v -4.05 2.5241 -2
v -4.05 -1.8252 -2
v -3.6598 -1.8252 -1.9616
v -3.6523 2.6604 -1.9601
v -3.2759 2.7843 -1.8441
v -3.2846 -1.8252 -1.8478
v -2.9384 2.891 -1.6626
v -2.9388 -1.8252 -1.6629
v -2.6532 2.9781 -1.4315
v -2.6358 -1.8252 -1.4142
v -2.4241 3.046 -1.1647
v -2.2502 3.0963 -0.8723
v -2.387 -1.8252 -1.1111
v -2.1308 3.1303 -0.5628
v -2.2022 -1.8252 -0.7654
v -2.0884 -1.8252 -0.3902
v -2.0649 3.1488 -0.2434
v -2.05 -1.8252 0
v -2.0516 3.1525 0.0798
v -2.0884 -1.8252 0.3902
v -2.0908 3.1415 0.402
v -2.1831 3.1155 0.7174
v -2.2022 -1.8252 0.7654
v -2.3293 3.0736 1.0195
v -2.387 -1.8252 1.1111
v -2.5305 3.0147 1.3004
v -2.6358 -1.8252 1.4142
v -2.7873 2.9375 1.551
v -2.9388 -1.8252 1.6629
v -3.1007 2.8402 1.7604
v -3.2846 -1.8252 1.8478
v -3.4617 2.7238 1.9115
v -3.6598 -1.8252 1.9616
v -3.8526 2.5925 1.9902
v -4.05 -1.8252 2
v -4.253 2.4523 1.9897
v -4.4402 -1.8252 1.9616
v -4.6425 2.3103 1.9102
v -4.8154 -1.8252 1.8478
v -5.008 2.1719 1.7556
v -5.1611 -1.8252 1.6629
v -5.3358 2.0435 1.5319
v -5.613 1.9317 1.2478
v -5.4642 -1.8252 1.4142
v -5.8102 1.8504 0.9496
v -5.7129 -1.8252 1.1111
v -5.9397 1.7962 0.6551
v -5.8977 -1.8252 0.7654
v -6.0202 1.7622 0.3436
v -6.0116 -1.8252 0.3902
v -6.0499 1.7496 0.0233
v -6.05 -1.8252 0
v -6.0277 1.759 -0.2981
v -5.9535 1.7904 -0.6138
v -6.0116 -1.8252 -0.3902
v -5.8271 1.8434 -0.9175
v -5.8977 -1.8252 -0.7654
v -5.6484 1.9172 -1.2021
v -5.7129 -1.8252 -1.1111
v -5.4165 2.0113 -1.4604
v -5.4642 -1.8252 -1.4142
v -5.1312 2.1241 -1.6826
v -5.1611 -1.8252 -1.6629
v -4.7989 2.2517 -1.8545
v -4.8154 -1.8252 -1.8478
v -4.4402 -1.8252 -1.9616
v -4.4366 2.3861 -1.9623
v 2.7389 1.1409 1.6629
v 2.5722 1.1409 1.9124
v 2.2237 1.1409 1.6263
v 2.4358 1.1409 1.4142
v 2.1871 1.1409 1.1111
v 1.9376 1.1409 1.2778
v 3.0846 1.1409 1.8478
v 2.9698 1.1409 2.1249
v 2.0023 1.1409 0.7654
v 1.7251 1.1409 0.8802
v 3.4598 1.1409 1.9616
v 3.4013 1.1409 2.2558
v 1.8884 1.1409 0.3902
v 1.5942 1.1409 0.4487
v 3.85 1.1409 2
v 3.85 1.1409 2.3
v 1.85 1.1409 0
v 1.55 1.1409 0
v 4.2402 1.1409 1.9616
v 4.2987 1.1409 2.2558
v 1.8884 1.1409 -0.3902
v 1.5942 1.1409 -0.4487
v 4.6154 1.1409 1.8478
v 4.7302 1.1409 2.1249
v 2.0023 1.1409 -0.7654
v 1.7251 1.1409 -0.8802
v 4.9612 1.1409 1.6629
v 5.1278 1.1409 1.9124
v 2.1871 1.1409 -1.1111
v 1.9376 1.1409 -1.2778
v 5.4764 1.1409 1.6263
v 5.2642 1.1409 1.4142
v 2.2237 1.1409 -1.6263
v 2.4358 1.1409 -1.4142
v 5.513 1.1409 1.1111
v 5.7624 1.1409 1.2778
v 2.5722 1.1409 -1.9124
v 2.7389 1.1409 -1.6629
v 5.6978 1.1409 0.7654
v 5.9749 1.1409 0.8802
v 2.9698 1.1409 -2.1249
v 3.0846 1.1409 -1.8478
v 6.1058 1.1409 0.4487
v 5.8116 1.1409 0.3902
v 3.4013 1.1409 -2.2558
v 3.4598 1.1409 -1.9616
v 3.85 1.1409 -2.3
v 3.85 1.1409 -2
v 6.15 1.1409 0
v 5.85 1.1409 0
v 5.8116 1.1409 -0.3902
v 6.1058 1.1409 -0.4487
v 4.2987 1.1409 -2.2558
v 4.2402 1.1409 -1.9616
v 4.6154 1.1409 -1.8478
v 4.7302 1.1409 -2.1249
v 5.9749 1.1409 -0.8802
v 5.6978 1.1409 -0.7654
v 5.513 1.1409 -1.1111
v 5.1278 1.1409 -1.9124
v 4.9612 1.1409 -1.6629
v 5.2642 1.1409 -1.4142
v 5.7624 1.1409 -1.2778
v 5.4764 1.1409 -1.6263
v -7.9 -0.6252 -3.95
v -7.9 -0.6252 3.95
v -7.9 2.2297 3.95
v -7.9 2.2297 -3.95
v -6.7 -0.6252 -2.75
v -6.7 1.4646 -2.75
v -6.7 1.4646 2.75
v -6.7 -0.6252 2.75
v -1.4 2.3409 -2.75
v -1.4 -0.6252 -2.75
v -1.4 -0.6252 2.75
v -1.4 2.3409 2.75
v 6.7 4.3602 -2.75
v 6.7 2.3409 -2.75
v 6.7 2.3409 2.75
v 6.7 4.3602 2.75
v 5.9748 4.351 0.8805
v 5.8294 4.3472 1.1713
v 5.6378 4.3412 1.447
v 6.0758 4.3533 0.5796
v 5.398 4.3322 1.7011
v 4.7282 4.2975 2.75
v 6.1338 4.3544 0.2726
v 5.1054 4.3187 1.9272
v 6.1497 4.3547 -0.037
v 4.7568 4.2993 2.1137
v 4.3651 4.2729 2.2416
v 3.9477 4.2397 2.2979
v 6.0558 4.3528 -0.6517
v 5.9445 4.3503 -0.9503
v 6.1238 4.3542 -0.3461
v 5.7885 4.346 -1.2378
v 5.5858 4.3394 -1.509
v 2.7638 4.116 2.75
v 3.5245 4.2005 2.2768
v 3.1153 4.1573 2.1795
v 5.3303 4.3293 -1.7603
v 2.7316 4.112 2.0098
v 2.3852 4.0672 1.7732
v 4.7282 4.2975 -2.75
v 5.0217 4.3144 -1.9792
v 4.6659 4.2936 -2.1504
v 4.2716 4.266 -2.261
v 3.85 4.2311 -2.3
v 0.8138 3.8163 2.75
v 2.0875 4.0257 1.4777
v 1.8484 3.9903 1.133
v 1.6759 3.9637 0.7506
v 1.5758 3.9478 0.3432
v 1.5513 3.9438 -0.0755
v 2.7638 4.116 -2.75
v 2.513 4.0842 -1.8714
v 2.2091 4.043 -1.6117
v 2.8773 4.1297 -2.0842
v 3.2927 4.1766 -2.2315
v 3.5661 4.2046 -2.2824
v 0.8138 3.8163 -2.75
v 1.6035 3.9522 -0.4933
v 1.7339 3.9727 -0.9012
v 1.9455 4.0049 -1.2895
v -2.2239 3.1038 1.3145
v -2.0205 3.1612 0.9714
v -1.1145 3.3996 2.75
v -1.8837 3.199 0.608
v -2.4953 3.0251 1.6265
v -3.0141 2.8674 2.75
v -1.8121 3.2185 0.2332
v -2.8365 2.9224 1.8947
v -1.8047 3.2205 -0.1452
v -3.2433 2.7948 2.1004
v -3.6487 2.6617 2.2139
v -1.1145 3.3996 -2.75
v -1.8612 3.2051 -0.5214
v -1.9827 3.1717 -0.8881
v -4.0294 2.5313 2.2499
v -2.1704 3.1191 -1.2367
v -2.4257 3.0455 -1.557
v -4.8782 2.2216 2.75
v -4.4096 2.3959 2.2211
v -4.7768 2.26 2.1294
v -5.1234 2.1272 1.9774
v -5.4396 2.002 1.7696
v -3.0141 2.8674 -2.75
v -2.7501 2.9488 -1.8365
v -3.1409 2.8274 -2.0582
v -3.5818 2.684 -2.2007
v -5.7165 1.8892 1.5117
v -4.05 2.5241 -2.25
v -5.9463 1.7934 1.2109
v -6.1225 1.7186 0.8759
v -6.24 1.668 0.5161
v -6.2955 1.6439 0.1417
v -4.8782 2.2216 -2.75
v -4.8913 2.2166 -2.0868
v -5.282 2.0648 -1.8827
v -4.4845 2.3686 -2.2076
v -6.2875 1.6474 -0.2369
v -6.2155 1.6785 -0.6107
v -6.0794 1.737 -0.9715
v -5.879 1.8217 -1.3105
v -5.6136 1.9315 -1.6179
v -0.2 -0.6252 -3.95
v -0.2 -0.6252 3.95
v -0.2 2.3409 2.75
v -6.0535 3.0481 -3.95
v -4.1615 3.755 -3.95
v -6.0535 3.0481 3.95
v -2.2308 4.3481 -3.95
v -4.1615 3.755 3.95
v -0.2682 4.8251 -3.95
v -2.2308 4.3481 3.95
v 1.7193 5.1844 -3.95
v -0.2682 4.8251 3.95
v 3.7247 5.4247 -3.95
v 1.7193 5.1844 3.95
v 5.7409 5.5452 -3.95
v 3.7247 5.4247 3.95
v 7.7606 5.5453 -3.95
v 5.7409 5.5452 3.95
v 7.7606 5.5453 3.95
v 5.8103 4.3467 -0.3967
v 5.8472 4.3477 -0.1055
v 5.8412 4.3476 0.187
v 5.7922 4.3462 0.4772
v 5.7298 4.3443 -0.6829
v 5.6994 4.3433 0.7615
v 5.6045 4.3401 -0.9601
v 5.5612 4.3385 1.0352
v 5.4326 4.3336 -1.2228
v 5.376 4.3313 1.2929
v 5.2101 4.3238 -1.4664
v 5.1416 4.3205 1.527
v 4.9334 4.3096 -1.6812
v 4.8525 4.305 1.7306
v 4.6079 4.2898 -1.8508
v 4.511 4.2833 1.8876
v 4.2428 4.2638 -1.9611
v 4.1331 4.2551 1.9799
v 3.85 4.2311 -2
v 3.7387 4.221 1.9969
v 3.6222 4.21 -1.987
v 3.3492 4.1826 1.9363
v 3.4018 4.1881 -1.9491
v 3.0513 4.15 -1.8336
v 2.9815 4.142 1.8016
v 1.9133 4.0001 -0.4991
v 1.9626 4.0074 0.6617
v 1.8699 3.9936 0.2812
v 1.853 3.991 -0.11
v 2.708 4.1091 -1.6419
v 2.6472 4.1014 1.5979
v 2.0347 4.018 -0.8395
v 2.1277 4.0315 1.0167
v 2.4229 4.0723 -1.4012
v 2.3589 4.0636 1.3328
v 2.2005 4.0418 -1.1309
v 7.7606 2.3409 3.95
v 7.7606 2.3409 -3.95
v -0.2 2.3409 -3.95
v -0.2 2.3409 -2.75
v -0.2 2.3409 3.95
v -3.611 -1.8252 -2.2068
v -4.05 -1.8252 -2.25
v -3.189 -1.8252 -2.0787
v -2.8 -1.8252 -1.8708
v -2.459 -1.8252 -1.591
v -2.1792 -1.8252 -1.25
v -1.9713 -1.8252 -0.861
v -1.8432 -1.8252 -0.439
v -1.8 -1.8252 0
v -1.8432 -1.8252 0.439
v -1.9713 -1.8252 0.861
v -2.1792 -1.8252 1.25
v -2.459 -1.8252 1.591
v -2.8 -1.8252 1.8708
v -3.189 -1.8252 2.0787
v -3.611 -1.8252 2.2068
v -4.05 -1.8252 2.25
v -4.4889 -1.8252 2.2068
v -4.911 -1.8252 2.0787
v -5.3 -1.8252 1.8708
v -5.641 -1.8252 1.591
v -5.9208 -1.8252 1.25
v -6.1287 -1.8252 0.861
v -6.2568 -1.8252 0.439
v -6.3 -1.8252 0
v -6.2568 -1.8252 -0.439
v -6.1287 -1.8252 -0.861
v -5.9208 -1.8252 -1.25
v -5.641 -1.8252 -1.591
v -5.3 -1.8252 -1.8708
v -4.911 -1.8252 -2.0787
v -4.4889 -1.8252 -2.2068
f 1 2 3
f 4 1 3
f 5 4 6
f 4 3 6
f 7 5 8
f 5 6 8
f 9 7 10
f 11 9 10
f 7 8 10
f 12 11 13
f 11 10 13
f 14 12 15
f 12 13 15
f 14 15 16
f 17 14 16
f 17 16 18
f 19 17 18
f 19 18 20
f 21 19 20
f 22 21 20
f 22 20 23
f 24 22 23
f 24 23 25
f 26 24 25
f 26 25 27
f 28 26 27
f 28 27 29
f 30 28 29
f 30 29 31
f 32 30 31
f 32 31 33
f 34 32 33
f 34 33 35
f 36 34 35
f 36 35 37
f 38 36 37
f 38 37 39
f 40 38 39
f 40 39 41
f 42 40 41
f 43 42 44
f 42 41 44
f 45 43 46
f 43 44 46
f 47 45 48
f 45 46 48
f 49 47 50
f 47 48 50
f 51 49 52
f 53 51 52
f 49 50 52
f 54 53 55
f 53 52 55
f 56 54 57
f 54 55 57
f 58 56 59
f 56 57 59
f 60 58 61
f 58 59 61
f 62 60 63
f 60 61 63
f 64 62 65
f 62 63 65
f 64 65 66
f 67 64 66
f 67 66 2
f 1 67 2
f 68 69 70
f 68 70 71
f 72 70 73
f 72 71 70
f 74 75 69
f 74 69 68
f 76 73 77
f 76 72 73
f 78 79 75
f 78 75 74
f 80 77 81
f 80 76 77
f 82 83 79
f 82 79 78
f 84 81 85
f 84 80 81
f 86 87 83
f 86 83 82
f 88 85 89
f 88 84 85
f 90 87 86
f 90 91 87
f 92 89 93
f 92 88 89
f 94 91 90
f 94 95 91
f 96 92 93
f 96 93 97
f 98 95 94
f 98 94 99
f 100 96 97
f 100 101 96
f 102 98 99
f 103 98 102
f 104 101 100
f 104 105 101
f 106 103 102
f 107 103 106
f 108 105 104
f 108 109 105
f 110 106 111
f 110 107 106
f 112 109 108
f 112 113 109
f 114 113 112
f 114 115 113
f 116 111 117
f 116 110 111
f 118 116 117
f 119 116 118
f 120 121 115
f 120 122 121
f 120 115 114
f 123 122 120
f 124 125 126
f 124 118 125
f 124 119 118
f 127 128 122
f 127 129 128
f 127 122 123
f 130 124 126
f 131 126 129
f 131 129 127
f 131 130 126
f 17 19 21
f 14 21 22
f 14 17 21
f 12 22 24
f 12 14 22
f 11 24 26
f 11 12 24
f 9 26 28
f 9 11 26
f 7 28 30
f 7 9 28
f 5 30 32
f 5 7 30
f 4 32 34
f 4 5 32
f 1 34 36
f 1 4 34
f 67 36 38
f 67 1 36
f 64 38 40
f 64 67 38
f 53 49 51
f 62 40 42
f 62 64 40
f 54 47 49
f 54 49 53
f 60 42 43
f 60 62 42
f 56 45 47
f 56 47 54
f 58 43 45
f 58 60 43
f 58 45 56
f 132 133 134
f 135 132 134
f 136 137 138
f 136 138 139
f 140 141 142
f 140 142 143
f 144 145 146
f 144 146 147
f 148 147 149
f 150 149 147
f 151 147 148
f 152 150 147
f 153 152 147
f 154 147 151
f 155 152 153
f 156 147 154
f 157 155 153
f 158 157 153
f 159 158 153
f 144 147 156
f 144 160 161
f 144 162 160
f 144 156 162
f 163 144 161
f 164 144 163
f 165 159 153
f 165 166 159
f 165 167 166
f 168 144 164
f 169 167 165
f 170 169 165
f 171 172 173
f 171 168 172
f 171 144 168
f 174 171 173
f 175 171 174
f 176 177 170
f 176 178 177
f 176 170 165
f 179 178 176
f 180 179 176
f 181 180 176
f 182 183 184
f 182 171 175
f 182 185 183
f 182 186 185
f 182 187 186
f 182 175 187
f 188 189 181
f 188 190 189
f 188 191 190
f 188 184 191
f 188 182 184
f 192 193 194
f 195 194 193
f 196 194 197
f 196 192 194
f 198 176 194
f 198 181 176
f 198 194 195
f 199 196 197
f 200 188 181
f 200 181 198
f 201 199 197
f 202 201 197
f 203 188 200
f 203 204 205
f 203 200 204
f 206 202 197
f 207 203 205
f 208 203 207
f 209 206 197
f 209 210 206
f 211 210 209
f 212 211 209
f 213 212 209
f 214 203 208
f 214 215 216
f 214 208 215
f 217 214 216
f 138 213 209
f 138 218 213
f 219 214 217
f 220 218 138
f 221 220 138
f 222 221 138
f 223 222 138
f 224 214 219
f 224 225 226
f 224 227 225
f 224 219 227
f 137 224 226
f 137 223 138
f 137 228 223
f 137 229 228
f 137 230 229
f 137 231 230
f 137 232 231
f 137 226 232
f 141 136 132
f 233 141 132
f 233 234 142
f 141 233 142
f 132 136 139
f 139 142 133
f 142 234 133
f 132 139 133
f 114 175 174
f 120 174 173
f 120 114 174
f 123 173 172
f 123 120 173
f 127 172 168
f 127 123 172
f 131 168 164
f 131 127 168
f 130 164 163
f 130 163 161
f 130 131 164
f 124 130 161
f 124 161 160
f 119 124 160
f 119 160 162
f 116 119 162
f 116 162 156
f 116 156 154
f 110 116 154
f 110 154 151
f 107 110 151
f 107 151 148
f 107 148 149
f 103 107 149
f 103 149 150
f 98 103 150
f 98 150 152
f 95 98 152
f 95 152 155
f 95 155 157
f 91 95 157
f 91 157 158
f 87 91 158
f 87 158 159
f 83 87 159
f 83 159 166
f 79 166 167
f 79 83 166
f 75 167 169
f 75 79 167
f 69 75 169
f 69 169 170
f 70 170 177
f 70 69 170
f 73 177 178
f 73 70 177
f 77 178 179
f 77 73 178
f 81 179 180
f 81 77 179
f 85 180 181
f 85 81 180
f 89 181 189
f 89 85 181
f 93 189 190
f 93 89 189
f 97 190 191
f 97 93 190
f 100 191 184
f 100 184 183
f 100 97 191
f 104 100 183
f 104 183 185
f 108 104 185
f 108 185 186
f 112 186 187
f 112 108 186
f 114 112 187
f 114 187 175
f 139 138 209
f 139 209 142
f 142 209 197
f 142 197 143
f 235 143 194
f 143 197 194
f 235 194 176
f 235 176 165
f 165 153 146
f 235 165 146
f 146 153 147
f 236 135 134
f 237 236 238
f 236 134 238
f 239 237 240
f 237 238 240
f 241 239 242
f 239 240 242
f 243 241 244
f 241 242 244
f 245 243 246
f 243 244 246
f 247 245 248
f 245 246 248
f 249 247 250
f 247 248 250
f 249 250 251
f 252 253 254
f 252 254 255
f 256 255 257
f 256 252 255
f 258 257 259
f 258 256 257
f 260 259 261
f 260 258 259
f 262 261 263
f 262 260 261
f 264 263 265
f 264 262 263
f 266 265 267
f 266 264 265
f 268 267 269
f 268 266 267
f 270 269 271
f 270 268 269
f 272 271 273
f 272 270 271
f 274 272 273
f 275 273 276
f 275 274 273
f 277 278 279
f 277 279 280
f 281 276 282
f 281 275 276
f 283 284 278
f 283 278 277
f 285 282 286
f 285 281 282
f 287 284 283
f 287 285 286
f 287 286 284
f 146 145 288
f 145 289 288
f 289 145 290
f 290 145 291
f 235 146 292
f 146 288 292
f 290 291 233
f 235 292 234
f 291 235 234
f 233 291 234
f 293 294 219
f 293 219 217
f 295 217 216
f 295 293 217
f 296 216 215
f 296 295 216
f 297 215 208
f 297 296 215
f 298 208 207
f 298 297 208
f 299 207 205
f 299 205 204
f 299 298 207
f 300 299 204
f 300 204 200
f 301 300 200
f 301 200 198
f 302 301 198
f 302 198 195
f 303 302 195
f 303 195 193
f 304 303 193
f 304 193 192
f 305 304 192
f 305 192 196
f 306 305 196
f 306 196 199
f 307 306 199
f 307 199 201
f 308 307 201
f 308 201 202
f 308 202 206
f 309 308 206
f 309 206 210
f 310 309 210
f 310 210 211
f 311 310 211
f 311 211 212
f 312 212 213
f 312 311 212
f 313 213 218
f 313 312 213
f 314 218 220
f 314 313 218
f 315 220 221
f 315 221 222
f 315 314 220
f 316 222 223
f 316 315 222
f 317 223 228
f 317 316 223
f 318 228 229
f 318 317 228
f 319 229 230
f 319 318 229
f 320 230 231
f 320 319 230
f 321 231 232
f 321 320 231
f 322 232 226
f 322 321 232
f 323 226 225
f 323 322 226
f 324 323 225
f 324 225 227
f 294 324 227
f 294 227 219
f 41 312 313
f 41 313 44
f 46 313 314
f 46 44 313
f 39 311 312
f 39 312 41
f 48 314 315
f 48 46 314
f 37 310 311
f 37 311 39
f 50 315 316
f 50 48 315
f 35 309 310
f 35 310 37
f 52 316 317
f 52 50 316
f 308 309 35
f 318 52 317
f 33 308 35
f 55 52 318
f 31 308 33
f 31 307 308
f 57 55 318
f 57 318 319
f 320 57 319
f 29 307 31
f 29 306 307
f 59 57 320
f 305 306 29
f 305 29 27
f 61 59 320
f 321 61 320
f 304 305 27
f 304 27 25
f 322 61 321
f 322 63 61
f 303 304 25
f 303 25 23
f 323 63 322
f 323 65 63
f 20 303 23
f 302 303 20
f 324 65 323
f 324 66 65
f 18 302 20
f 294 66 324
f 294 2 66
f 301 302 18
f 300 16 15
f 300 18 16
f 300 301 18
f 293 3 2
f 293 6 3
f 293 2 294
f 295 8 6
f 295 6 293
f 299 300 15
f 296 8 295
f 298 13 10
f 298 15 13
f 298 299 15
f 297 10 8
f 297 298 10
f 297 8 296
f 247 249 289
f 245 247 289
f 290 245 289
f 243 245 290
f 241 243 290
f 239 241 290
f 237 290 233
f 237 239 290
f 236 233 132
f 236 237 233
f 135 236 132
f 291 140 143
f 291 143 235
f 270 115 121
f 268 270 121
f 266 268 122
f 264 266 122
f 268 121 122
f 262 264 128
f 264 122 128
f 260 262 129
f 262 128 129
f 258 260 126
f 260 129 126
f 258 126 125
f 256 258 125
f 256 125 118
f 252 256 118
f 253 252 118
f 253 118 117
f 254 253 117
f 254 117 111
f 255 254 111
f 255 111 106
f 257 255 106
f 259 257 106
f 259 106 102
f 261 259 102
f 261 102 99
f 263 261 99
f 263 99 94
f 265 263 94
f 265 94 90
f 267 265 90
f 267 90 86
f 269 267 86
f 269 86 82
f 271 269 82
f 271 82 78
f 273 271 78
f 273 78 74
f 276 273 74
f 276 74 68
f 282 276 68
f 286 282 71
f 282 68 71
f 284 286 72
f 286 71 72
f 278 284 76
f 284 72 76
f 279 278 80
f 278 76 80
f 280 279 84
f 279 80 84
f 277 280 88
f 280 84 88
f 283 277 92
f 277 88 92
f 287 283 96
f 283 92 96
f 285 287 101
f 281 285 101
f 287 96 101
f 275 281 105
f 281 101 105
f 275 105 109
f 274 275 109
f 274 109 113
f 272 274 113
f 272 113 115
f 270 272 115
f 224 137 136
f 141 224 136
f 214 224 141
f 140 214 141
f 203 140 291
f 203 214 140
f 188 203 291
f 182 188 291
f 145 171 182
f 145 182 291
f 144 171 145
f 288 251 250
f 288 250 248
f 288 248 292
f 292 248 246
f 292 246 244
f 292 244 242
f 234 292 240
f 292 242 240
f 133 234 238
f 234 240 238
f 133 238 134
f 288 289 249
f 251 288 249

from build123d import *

# Parameters (mm, degrees)
BOSS_EXTRUDE1_DEPTH      = 3.95
SHELL1_START             = -2.75
SHELL1_DEPTH             = 5.5
BOSS_EXTRUDE2_REACH      = 12.601
BOSS_EXTRUDE2_END_RADIUS = 32.700000868
BOSS_EXTRUDE2_START      = 1.2
SKETCH8_R                = 2.3
SKETCH8_R_2              = 2
BOSS_EXTRUDE3_REACH      = 13.983
BOSS_EXTRUDE3_END_RADIUS = 32.700000868
BOSS_EXTRUDE3_START      = 1.2
SKETCH9_R                = 2.25
SKETCH9_R_2              = 2
CUT_EXTRUDE5_DEPTH       = 13.479454835


# Read off the part's stored shape, not the designer's step: Shell1
with BuildPart() as part:
    # Sketch1 → Boss-Extrude1 (new, symmetric)
    with BuildSketch(Plane.XY):
        with BuildLine():
            Line((-7.9, -0.625209461), (-7.9, 2.229657062))
            ThreePointArc((-7.9, 2.229657062), (-0.19997769, 4.839494926), (7.9, 5.540892579))
            Line((7.9, 5.540892579), (7.9, 2.340892579))
            Line((7.9, 2.340892579), (-0.19997769, 2.340892579))
            Line((-0.19997769, 2.340892579), (-0.19997769, -0.625209461))
            Line((-0.19997769, -0.625209461), (-7.9, -0.625209461))
        make_face()
    extrude(amount=BOSS_EXTRUDE1_DEPTH, both=True)

    # Shell1 outline → Shell1 (cut)
    with BuildSketch(Plane.XY.offset(SHELL1_START)):
        with BuildLine():
            Line((-1.39997769, 2.340892579), (6.7, 2.340892579))
            Line((6.7, 2.340892579), (6.7, 4.360243445))
            ThreePointArc((6.7, 4.360243445), (-0.153454716, 3.622525068), (-6.7, 1.464559639))
            Line((-6.7, 1.464559639), (-6.7, -0.625209461))
            Line((-6.7, -0.625209461), (-1.39997769, -0.625209461))
            Line((-1.39997769, -0.625209461), (-1.39997769, 2.340892579))
        make_face()
    extrude(amount=SHELL1_DEPTH, mode=Mode.SUBTRACT)

    # Boss-Extrude2: up to this cylinder (the profile starts inside it)
    boss_extrude2_end = Plane(origin=(6.753451055, -28.339713738, 2.234946), z_dir=(0, 0, -1)) * Cylinder(BOSS_EXTRUDE2_END_RADIUS, 91.602001737, mode=Mode.PRIVATE)
    # Sketch8 → Boss-Extrude2 (add, up to the surface)
    with BuildSketch(Plane(origin=(0, 2.340892579, 0), x_dir=(-1, 0, 0), z_dir=(0, -1, 0)).offset(BOSS_EXTRUDE2_START), mode=Mode.PRIVATE) as boss_extrude2_sk1:
        with Locations(Location((-3.850011155, 0, 0), (0, 0, 90))):
            Circle(SKETCH8_R)
        with Locations(Location((-3.850011155, 0, 0), (0, 0, 90))):
            Circle(SKETCH8_R_2, mode=Mode.SUBTRACT)
    boss_extrude2_tool1 = extrude(boss_extrude2_sk1.sketch, amount=-BOSS_EXTRUDE2_REACH, mode=Mode.PRIVATE) & boss_extrude2_end
    add(boss_extrude2_tool1.solids().sort_by_distance((3.850011, 1.140893, 2.234946))[0])

    # Boss-Extrude3: up to this cylinder (the profile starts inside it)
    boss_extrude3_end = Plane(origin=(6.753451055, -28.339713738, 2.18636), z_dir=(0, 0, -1)) * Cylinder(BOSS_EXTRUDE3_END_RADIUS, 94.366001737, mode=Mode.PRIVATE)
    # Sketch9 → Boss-Extrude3 (add, up to the surface)
    with BuildSketch(Plane(origin=(0, -0.625209461, 0), x_dir=(-1, 0, 0), z_dir=(0, -1, 0)).offset(BOSS_EXTRUDE3_START), mode=Mode.PRIVATE) as boss_extrude3_sk1:
        with Locations(Location((4.049988845, 0, 0), (0, 0, 90))):
            Circle(SKETCH9_R)
        with Locations(Location((4.049988845, 0, 0), (0, 0, 90))):
            Circle(SKETCH9_R_2, mode=Mode.SUBTRACT)
    boss_extrude3_tool1 = extrude(boss_extrude3_sk1.sketch, amount=-BOSS_EXTRUDE3_REACH, mode=Mode.PRIVATE) & boss_extrude3_end
    add(boss_extrude3_tool1.solids().sort_by_distance((-4.049989, -1.825209, 2.18636))[0])

    # Sketch10 → Cut-Extrude5 (cut, through all)
    with BuildSketch(Plane(origin=(0, 0, -3.95), x_dir=(-1, 0, 0), z_dir=(0, 0, -1))):
        Polygon((-7.9, 2.340892579), (-7.760644151, 2.340892579), (-7.760644151, 5.545321616), (-7.9, 5.540892579), align=None)
    extrude(amount=-CUT_EXTRUDE5_DEPTH, mode=Mode.SUBTRACT)


with BuildPart() as cut_extrude5_kept_piece:
    # of the separate pieces the step leaves, the one the design keeps (cut_extrude5_pieces_kept)
    add(part.part.solids().sort_by_distance((-7.9, -0.625209461, -3.95))[0])


solid = cut_extrude5_kept_piece.part
